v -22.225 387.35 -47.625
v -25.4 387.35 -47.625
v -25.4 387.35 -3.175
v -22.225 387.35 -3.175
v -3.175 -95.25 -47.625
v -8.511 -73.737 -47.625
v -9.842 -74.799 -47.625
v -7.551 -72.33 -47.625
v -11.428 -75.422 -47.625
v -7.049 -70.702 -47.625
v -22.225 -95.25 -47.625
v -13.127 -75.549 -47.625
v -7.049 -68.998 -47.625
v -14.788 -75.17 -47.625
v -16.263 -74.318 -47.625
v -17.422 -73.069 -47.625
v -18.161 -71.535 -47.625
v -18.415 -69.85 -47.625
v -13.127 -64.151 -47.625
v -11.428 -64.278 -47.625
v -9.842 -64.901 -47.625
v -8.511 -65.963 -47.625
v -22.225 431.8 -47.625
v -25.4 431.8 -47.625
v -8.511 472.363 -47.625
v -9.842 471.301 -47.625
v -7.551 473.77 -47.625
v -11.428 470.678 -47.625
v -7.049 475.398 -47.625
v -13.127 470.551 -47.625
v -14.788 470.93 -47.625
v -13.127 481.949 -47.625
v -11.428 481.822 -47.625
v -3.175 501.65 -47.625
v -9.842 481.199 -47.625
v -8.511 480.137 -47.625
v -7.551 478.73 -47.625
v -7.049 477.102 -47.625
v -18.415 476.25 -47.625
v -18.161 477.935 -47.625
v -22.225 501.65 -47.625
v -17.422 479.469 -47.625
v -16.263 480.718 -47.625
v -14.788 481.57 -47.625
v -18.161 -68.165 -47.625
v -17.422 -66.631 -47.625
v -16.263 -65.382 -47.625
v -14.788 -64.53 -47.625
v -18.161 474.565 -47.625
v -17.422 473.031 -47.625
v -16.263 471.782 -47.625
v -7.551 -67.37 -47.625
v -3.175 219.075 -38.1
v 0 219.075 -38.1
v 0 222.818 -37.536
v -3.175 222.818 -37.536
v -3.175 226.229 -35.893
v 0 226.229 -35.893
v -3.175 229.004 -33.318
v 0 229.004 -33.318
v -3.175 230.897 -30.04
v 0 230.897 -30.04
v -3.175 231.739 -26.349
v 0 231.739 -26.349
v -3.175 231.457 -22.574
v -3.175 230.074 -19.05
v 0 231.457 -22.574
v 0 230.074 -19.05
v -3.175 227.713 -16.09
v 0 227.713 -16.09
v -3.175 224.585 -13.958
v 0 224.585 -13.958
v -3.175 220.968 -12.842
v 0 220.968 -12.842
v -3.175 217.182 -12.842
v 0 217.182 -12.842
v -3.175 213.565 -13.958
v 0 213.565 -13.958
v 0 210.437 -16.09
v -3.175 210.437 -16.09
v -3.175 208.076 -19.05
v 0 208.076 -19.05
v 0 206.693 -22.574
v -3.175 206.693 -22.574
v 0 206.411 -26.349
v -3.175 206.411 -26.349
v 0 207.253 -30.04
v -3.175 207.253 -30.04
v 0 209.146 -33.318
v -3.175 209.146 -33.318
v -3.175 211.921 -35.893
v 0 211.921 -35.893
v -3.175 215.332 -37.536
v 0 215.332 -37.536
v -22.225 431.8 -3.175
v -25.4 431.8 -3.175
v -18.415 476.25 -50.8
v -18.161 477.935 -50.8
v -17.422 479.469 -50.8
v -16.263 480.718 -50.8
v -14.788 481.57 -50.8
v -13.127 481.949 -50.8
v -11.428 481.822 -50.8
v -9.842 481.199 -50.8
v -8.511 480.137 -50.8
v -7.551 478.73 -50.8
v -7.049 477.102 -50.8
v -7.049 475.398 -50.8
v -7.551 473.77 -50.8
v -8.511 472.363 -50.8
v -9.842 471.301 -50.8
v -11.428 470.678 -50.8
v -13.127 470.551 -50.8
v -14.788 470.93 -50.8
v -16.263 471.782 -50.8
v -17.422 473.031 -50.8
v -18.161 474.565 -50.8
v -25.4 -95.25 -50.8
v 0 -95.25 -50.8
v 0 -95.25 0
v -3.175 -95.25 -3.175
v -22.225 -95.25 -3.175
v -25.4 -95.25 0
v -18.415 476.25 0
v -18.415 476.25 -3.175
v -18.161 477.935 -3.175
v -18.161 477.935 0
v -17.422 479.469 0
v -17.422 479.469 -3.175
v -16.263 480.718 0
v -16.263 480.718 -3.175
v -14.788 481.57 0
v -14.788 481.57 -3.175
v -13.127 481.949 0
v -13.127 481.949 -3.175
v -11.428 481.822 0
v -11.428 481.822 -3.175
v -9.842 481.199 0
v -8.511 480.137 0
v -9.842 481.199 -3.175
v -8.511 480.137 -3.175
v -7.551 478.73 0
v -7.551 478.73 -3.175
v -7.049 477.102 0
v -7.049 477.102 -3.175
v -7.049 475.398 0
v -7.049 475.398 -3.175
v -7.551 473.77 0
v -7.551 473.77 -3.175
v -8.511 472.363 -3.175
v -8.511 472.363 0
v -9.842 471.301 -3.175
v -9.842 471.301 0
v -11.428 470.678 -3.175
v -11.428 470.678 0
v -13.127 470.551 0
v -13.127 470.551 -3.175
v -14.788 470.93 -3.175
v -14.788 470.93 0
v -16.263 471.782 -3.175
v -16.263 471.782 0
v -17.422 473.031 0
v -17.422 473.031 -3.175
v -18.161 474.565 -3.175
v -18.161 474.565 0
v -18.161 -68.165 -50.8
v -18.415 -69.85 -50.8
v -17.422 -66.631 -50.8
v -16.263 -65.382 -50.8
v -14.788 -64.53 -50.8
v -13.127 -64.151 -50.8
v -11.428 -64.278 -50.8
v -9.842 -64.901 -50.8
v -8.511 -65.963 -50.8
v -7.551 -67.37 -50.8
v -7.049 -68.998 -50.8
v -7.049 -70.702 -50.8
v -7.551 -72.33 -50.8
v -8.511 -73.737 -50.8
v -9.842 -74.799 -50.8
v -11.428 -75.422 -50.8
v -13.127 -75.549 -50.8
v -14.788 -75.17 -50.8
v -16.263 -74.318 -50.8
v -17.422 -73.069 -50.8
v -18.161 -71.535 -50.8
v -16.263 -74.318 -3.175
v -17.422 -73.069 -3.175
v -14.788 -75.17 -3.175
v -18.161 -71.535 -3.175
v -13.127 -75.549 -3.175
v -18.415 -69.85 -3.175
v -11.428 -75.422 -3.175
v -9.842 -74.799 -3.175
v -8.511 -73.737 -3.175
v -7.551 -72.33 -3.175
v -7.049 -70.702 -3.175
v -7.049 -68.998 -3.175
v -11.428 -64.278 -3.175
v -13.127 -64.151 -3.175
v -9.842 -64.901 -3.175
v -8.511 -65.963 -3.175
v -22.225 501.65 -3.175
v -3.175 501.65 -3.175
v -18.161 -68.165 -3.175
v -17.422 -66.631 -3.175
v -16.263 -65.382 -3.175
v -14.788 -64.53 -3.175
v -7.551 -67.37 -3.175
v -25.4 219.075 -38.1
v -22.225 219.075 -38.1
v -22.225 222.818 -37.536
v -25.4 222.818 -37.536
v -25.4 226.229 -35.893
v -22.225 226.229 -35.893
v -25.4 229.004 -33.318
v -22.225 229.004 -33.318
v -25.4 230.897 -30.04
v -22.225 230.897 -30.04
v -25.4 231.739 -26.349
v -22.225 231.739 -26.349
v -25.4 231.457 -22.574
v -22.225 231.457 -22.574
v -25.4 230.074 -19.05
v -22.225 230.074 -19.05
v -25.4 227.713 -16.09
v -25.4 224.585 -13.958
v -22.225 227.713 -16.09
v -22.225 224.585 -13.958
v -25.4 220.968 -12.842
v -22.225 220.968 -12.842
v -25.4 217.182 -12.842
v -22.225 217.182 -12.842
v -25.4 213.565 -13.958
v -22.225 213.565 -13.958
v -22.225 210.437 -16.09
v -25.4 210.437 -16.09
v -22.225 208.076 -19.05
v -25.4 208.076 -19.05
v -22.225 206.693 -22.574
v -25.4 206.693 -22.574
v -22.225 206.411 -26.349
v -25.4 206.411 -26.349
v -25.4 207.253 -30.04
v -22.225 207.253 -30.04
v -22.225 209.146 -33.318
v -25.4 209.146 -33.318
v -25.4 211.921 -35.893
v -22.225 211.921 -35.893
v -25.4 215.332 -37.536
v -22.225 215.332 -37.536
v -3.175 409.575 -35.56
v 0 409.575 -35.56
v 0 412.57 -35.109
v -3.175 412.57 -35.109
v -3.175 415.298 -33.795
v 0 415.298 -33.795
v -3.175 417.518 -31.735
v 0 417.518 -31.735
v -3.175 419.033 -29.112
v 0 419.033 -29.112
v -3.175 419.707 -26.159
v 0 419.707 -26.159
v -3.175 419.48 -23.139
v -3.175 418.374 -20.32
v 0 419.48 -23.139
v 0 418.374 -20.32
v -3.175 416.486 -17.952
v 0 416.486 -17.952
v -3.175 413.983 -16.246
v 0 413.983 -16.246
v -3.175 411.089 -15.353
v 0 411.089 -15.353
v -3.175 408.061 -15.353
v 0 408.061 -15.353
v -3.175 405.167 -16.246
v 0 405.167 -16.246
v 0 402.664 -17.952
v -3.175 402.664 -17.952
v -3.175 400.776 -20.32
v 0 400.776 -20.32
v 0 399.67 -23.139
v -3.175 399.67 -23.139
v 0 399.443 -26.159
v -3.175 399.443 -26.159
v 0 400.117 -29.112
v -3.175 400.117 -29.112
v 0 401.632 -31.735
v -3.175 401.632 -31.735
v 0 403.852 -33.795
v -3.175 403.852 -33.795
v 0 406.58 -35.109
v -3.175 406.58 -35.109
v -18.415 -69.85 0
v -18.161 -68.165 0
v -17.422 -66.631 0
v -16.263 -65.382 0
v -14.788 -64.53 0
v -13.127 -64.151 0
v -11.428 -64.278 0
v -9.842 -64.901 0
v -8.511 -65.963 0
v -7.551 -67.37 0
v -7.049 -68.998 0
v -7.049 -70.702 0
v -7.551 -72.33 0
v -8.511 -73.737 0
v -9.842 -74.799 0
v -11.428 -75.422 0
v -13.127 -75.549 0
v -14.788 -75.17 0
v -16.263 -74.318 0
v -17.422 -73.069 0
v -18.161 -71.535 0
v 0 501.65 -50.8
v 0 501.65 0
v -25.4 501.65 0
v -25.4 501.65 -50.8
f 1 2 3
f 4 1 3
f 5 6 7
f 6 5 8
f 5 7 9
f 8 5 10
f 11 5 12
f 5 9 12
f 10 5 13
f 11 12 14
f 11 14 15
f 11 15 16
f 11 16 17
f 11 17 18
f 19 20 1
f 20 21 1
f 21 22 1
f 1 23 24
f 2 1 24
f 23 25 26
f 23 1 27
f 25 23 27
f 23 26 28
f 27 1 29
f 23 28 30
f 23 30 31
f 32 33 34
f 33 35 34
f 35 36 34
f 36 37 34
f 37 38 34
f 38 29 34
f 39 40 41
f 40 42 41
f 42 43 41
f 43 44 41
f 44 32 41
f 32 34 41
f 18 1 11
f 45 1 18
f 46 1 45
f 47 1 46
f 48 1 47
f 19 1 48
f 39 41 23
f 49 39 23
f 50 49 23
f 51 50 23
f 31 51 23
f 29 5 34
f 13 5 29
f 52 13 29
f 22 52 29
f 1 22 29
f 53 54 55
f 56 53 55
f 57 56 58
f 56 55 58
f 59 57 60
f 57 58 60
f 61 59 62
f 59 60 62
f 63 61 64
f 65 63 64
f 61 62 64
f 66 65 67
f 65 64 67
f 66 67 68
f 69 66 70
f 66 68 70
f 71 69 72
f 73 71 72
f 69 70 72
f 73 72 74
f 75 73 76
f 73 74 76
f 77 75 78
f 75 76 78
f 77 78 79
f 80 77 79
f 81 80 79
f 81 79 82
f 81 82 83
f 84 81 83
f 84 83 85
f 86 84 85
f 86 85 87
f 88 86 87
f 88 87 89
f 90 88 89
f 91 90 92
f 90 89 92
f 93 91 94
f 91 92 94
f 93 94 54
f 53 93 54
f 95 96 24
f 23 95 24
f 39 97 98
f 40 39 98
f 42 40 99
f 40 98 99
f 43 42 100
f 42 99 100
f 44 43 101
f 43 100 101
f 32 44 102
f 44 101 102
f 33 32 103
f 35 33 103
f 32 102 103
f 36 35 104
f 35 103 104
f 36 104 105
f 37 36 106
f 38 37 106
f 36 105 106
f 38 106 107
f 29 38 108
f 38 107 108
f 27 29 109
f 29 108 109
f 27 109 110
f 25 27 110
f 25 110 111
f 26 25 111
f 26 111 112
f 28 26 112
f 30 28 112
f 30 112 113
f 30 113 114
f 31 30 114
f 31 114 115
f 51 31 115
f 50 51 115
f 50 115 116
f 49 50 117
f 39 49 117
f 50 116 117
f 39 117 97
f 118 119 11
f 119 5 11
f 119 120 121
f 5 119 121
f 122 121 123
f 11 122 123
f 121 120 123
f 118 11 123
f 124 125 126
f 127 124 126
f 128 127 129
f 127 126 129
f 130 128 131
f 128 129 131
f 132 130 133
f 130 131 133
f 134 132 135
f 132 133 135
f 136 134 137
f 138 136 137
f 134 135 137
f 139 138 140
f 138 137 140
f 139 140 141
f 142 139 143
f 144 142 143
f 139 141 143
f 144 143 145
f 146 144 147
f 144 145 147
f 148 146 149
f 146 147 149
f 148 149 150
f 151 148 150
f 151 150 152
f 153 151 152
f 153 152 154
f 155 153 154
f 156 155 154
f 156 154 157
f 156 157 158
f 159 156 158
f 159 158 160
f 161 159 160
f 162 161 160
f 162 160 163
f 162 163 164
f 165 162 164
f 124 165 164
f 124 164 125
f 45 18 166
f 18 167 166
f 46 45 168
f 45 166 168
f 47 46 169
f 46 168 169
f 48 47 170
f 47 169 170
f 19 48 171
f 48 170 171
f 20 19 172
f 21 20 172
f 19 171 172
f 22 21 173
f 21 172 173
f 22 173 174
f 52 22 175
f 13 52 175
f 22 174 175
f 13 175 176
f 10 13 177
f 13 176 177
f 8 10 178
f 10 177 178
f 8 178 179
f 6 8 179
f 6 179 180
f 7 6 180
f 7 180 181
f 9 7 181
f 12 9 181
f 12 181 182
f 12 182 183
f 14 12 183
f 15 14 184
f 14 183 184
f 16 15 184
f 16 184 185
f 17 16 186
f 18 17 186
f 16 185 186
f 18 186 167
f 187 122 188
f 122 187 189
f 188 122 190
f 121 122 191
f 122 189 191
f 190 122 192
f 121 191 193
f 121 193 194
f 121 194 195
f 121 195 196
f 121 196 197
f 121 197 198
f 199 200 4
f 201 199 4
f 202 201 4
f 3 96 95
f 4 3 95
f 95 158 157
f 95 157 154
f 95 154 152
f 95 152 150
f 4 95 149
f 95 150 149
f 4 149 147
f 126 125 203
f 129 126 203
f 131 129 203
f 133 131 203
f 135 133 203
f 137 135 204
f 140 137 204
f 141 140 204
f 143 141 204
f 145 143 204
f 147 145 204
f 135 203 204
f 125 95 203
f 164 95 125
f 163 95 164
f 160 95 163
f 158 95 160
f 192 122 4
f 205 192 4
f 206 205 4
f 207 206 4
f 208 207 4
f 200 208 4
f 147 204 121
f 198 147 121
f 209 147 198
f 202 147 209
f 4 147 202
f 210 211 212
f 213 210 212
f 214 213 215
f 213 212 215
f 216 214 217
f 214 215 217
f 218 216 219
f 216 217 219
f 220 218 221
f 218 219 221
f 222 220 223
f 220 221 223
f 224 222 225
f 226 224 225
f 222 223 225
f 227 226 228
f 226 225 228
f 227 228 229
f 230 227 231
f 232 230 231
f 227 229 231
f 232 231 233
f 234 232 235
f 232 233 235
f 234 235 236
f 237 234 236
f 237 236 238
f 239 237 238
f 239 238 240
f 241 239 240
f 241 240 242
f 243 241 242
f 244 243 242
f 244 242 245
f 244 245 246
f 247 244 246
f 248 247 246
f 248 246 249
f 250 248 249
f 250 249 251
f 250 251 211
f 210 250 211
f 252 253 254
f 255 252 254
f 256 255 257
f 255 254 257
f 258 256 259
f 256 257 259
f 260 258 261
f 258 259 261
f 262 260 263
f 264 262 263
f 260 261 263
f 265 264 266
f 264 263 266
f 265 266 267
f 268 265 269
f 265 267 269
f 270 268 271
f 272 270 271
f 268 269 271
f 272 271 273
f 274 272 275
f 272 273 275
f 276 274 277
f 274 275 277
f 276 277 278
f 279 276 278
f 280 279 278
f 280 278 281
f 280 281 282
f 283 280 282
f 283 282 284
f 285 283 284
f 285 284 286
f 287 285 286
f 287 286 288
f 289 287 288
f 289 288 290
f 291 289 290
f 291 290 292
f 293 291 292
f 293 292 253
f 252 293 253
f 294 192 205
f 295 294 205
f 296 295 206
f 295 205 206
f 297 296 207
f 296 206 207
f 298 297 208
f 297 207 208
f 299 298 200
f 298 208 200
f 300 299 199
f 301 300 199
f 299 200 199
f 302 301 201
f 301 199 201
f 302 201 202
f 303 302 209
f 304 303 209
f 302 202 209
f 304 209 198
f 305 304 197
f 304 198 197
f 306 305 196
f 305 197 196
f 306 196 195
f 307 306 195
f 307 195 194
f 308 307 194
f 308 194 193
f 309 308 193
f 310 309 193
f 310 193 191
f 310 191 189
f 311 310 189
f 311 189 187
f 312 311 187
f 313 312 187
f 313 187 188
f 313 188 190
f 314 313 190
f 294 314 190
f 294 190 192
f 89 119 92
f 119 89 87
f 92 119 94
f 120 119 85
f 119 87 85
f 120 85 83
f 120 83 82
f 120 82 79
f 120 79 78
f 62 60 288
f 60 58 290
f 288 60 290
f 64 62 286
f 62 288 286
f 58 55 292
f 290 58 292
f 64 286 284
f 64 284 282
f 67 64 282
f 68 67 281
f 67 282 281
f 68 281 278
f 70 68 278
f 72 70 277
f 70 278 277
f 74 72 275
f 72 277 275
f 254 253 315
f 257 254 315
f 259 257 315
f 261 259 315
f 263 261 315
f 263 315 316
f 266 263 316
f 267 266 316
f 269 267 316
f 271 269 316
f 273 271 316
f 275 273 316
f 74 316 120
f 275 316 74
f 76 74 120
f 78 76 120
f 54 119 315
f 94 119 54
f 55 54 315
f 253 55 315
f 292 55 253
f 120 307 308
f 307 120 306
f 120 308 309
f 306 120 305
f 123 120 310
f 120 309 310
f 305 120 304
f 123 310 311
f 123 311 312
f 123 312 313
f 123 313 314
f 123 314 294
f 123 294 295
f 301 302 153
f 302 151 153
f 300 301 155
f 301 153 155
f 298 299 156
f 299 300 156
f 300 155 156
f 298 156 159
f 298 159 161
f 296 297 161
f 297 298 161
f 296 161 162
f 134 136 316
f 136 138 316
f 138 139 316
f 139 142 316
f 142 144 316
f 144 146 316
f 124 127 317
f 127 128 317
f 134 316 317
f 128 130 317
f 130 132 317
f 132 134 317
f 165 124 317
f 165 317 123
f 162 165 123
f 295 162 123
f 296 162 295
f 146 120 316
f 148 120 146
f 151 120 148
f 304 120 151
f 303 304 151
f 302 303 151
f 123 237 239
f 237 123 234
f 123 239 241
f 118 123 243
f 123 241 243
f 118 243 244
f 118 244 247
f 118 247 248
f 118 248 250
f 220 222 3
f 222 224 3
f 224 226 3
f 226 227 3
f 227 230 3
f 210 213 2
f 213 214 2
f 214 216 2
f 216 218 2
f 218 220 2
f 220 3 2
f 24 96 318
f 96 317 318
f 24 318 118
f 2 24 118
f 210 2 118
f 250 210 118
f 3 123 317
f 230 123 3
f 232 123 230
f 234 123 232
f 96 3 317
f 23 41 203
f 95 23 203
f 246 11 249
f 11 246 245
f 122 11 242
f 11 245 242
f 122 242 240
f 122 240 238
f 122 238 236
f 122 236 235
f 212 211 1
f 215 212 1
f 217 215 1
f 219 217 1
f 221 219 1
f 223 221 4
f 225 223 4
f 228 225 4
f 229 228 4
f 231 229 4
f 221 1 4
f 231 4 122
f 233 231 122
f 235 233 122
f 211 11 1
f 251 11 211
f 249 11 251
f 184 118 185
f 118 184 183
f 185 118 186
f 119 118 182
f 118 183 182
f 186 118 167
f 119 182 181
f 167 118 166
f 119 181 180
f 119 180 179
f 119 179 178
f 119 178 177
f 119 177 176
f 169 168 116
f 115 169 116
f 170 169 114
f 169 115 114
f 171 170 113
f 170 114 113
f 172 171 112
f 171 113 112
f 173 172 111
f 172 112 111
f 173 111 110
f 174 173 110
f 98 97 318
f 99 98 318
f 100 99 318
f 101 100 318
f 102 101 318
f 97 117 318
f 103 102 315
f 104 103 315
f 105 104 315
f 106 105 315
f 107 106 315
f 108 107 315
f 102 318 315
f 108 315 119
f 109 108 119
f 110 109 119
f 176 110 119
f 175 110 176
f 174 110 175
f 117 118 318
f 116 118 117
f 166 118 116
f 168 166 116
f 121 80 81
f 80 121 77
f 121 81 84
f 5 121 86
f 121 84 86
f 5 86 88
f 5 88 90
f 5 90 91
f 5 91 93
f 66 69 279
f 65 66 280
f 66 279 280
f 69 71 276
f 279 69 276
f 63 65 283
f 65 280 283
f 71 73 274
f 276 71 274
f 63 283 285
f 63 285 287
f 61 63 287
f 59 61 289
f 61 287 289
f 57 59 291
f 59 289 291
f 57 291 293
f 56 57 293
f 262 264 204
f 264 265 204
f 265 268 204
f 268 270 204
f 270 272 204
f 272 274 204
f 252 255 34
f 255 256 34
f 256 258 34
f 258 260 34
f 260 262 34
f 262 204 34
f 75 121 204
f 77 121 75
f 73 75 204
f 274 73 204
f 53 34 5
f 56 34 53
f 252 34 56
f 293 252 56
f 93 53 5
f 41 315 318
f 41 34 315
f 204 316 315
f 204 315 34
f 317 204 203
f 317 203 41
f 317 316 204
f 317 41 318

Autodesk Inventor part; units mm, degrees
ref_plane "YZ Plane" through (0, 0, 0) normal (1, 0, 0) x (0, 1, 0)
ref_plane "XZ Plane" through (0, 0, 0) normal (0, 1, 0) x (-1, 0, 0)
ref_plane "XY Plane" through (0, 0, 0) normal (0, 0, 1) x (1, 0, 0)
sketch "Sketch1" plane through (0, 0, 0) normal (0, 1, 0) x (-1, 0, 0)
  line L0 (0, 0) -> (25.4, 0)
  line L1 (25.4, 0) -> (25.4, -50.8)
  line L2 (25.4, -50.8) -> (0, -50.8)
  line L3 (0, -50.8) -> (0, 0)
  line L4 (22.225, -47.625) -> (22.225, -3.175)
  line L5 (22.225, -3.175) -> (3.175, -3.175)
  line L6 (3.175, -3.175) -> (3.175, -47.625)
  line L7 (3.175, -47.625) -> (22.225, -47.625)
  dimension "d0" = 50.8
  dimension "d1" = 25.4
  dimension "d2" = 3.175
extrude "Extrusion1" add sketch "Sketch1" along normal blind 501.65
sketch "Sketch2" plane through (0, 0, 0) normal (1, 0, 0) x (0, 0, -1)
  circle A0 centre (25.4, 219.075) radius 12.7
  line L0 (0, 0) -> (0, 501.65) projected
  line L1 (50.8, 0) -> (0, 0) projected
  line L2 (50.8, 501.65) -> (0, 501.65) projected
  dimension "d5" = 25.4
  dimension "d6" = 25.4
  dimension "d24" = 282.575
extrude "Extrusion2" cut sketch "Sketch2" against normal blind 25.4
sketch "Sketch4" plane through (-22.225, 0, -47.625) normal (1, 0, 0) x (0, 0, -1)
  circle A0 centre (-22.225, 415.925) radius 7.62
  line L0 (-47.625, 501.65) -> (3.175, 501.65) projected
  line L1 (-47.625, 0) -> (-47.625, 501.65) projected
  dimension "d15" = 25.4
  dimension "d16" = 15.24
  dimension "d20" = 85.725
extrude "Extrusion4" cut sketch "Sketch4" against normal blind 12.7
extrude "Extrusion5" add sketch "Sketch1" against normal blind 95.25
sketch "Sketch8" plane through (-25.4, 501.65, -50.8) normal (-1, 0, 0) x (0, 0, 1)
  line L0 (47.625, -69.85) -> (3.175, -69.85)
  line L1 (3.175, -69.85) -> (3.175, -114.3)
  line L2 (3.175, -114.3) -> (47.625, -114.3)
  line L3 (47.625, -114.3) -> (47.625, -69.85)
  line L4 (0, 0) -> (50.8, 0) projected
  line L5 (47.625, -596.9) -> (47.625, 0) projected
  line L6 (3.175, 0) -> (3.175, -596.9) projected
  point P0 (50.8, -501.65)
  dimension "d29" = 69.85
  dimension "d30" = 0
  dimension "d31" = 0
  dimension "d32" = 44.45
extrude "Extrusion6" cut sketch "Sketch8" against normal blind 12.7 contours L3 L2 L1 L0
sketch "Sketch9" plane through (0, 501.65, 0) normal (1, 0, 0) x (0, 0, -1)
  circle A0 centre (25.4, -92.075) radius 10.16
  line L0 (0, 0) -> (50.8, 0) projected
  line L1 (50.8, 0) -> (50.8, -596.9) projected
  point P0 (0, -501.65)
  dimension "d35" = 92.075
  dimension "d36" = 25.4
  dimension "d37" = 20.32
extrude "Extrusion7" cut sketch "Sketch9" against normal blind 12.7
sketch "Sketch11" plane through (0, 501.65, -50.8) normal (0, 0, -1) x (-1, 0, 0)
  circle A0 centre (12.7, -25.4) radius 5.715
  line L0 (0, 0) -> (25.4, 0) projected
  line L1 (25.4, 0) -> (25.4, -596.9) projected
  circle A1 centre (12.7, -571.5) radius 5.715
  line L2 (25.4, -596.9) -> (0, -596.9) projected
  point P0 (0, -501.65)
  dimension "d48" = 11.43
  dimension "d49" = 25.4
  dimension "d50" = 12.7
  dimension "d51" = 11.43
  dimension "d52" = 12.7
  dimension "d53" = 25.4
extrude "Extrusion9" cut sketch "Sketch11" against normal blind 50.8
properties part number "2x1 16in Aluminum-ver1-1111-2020"
